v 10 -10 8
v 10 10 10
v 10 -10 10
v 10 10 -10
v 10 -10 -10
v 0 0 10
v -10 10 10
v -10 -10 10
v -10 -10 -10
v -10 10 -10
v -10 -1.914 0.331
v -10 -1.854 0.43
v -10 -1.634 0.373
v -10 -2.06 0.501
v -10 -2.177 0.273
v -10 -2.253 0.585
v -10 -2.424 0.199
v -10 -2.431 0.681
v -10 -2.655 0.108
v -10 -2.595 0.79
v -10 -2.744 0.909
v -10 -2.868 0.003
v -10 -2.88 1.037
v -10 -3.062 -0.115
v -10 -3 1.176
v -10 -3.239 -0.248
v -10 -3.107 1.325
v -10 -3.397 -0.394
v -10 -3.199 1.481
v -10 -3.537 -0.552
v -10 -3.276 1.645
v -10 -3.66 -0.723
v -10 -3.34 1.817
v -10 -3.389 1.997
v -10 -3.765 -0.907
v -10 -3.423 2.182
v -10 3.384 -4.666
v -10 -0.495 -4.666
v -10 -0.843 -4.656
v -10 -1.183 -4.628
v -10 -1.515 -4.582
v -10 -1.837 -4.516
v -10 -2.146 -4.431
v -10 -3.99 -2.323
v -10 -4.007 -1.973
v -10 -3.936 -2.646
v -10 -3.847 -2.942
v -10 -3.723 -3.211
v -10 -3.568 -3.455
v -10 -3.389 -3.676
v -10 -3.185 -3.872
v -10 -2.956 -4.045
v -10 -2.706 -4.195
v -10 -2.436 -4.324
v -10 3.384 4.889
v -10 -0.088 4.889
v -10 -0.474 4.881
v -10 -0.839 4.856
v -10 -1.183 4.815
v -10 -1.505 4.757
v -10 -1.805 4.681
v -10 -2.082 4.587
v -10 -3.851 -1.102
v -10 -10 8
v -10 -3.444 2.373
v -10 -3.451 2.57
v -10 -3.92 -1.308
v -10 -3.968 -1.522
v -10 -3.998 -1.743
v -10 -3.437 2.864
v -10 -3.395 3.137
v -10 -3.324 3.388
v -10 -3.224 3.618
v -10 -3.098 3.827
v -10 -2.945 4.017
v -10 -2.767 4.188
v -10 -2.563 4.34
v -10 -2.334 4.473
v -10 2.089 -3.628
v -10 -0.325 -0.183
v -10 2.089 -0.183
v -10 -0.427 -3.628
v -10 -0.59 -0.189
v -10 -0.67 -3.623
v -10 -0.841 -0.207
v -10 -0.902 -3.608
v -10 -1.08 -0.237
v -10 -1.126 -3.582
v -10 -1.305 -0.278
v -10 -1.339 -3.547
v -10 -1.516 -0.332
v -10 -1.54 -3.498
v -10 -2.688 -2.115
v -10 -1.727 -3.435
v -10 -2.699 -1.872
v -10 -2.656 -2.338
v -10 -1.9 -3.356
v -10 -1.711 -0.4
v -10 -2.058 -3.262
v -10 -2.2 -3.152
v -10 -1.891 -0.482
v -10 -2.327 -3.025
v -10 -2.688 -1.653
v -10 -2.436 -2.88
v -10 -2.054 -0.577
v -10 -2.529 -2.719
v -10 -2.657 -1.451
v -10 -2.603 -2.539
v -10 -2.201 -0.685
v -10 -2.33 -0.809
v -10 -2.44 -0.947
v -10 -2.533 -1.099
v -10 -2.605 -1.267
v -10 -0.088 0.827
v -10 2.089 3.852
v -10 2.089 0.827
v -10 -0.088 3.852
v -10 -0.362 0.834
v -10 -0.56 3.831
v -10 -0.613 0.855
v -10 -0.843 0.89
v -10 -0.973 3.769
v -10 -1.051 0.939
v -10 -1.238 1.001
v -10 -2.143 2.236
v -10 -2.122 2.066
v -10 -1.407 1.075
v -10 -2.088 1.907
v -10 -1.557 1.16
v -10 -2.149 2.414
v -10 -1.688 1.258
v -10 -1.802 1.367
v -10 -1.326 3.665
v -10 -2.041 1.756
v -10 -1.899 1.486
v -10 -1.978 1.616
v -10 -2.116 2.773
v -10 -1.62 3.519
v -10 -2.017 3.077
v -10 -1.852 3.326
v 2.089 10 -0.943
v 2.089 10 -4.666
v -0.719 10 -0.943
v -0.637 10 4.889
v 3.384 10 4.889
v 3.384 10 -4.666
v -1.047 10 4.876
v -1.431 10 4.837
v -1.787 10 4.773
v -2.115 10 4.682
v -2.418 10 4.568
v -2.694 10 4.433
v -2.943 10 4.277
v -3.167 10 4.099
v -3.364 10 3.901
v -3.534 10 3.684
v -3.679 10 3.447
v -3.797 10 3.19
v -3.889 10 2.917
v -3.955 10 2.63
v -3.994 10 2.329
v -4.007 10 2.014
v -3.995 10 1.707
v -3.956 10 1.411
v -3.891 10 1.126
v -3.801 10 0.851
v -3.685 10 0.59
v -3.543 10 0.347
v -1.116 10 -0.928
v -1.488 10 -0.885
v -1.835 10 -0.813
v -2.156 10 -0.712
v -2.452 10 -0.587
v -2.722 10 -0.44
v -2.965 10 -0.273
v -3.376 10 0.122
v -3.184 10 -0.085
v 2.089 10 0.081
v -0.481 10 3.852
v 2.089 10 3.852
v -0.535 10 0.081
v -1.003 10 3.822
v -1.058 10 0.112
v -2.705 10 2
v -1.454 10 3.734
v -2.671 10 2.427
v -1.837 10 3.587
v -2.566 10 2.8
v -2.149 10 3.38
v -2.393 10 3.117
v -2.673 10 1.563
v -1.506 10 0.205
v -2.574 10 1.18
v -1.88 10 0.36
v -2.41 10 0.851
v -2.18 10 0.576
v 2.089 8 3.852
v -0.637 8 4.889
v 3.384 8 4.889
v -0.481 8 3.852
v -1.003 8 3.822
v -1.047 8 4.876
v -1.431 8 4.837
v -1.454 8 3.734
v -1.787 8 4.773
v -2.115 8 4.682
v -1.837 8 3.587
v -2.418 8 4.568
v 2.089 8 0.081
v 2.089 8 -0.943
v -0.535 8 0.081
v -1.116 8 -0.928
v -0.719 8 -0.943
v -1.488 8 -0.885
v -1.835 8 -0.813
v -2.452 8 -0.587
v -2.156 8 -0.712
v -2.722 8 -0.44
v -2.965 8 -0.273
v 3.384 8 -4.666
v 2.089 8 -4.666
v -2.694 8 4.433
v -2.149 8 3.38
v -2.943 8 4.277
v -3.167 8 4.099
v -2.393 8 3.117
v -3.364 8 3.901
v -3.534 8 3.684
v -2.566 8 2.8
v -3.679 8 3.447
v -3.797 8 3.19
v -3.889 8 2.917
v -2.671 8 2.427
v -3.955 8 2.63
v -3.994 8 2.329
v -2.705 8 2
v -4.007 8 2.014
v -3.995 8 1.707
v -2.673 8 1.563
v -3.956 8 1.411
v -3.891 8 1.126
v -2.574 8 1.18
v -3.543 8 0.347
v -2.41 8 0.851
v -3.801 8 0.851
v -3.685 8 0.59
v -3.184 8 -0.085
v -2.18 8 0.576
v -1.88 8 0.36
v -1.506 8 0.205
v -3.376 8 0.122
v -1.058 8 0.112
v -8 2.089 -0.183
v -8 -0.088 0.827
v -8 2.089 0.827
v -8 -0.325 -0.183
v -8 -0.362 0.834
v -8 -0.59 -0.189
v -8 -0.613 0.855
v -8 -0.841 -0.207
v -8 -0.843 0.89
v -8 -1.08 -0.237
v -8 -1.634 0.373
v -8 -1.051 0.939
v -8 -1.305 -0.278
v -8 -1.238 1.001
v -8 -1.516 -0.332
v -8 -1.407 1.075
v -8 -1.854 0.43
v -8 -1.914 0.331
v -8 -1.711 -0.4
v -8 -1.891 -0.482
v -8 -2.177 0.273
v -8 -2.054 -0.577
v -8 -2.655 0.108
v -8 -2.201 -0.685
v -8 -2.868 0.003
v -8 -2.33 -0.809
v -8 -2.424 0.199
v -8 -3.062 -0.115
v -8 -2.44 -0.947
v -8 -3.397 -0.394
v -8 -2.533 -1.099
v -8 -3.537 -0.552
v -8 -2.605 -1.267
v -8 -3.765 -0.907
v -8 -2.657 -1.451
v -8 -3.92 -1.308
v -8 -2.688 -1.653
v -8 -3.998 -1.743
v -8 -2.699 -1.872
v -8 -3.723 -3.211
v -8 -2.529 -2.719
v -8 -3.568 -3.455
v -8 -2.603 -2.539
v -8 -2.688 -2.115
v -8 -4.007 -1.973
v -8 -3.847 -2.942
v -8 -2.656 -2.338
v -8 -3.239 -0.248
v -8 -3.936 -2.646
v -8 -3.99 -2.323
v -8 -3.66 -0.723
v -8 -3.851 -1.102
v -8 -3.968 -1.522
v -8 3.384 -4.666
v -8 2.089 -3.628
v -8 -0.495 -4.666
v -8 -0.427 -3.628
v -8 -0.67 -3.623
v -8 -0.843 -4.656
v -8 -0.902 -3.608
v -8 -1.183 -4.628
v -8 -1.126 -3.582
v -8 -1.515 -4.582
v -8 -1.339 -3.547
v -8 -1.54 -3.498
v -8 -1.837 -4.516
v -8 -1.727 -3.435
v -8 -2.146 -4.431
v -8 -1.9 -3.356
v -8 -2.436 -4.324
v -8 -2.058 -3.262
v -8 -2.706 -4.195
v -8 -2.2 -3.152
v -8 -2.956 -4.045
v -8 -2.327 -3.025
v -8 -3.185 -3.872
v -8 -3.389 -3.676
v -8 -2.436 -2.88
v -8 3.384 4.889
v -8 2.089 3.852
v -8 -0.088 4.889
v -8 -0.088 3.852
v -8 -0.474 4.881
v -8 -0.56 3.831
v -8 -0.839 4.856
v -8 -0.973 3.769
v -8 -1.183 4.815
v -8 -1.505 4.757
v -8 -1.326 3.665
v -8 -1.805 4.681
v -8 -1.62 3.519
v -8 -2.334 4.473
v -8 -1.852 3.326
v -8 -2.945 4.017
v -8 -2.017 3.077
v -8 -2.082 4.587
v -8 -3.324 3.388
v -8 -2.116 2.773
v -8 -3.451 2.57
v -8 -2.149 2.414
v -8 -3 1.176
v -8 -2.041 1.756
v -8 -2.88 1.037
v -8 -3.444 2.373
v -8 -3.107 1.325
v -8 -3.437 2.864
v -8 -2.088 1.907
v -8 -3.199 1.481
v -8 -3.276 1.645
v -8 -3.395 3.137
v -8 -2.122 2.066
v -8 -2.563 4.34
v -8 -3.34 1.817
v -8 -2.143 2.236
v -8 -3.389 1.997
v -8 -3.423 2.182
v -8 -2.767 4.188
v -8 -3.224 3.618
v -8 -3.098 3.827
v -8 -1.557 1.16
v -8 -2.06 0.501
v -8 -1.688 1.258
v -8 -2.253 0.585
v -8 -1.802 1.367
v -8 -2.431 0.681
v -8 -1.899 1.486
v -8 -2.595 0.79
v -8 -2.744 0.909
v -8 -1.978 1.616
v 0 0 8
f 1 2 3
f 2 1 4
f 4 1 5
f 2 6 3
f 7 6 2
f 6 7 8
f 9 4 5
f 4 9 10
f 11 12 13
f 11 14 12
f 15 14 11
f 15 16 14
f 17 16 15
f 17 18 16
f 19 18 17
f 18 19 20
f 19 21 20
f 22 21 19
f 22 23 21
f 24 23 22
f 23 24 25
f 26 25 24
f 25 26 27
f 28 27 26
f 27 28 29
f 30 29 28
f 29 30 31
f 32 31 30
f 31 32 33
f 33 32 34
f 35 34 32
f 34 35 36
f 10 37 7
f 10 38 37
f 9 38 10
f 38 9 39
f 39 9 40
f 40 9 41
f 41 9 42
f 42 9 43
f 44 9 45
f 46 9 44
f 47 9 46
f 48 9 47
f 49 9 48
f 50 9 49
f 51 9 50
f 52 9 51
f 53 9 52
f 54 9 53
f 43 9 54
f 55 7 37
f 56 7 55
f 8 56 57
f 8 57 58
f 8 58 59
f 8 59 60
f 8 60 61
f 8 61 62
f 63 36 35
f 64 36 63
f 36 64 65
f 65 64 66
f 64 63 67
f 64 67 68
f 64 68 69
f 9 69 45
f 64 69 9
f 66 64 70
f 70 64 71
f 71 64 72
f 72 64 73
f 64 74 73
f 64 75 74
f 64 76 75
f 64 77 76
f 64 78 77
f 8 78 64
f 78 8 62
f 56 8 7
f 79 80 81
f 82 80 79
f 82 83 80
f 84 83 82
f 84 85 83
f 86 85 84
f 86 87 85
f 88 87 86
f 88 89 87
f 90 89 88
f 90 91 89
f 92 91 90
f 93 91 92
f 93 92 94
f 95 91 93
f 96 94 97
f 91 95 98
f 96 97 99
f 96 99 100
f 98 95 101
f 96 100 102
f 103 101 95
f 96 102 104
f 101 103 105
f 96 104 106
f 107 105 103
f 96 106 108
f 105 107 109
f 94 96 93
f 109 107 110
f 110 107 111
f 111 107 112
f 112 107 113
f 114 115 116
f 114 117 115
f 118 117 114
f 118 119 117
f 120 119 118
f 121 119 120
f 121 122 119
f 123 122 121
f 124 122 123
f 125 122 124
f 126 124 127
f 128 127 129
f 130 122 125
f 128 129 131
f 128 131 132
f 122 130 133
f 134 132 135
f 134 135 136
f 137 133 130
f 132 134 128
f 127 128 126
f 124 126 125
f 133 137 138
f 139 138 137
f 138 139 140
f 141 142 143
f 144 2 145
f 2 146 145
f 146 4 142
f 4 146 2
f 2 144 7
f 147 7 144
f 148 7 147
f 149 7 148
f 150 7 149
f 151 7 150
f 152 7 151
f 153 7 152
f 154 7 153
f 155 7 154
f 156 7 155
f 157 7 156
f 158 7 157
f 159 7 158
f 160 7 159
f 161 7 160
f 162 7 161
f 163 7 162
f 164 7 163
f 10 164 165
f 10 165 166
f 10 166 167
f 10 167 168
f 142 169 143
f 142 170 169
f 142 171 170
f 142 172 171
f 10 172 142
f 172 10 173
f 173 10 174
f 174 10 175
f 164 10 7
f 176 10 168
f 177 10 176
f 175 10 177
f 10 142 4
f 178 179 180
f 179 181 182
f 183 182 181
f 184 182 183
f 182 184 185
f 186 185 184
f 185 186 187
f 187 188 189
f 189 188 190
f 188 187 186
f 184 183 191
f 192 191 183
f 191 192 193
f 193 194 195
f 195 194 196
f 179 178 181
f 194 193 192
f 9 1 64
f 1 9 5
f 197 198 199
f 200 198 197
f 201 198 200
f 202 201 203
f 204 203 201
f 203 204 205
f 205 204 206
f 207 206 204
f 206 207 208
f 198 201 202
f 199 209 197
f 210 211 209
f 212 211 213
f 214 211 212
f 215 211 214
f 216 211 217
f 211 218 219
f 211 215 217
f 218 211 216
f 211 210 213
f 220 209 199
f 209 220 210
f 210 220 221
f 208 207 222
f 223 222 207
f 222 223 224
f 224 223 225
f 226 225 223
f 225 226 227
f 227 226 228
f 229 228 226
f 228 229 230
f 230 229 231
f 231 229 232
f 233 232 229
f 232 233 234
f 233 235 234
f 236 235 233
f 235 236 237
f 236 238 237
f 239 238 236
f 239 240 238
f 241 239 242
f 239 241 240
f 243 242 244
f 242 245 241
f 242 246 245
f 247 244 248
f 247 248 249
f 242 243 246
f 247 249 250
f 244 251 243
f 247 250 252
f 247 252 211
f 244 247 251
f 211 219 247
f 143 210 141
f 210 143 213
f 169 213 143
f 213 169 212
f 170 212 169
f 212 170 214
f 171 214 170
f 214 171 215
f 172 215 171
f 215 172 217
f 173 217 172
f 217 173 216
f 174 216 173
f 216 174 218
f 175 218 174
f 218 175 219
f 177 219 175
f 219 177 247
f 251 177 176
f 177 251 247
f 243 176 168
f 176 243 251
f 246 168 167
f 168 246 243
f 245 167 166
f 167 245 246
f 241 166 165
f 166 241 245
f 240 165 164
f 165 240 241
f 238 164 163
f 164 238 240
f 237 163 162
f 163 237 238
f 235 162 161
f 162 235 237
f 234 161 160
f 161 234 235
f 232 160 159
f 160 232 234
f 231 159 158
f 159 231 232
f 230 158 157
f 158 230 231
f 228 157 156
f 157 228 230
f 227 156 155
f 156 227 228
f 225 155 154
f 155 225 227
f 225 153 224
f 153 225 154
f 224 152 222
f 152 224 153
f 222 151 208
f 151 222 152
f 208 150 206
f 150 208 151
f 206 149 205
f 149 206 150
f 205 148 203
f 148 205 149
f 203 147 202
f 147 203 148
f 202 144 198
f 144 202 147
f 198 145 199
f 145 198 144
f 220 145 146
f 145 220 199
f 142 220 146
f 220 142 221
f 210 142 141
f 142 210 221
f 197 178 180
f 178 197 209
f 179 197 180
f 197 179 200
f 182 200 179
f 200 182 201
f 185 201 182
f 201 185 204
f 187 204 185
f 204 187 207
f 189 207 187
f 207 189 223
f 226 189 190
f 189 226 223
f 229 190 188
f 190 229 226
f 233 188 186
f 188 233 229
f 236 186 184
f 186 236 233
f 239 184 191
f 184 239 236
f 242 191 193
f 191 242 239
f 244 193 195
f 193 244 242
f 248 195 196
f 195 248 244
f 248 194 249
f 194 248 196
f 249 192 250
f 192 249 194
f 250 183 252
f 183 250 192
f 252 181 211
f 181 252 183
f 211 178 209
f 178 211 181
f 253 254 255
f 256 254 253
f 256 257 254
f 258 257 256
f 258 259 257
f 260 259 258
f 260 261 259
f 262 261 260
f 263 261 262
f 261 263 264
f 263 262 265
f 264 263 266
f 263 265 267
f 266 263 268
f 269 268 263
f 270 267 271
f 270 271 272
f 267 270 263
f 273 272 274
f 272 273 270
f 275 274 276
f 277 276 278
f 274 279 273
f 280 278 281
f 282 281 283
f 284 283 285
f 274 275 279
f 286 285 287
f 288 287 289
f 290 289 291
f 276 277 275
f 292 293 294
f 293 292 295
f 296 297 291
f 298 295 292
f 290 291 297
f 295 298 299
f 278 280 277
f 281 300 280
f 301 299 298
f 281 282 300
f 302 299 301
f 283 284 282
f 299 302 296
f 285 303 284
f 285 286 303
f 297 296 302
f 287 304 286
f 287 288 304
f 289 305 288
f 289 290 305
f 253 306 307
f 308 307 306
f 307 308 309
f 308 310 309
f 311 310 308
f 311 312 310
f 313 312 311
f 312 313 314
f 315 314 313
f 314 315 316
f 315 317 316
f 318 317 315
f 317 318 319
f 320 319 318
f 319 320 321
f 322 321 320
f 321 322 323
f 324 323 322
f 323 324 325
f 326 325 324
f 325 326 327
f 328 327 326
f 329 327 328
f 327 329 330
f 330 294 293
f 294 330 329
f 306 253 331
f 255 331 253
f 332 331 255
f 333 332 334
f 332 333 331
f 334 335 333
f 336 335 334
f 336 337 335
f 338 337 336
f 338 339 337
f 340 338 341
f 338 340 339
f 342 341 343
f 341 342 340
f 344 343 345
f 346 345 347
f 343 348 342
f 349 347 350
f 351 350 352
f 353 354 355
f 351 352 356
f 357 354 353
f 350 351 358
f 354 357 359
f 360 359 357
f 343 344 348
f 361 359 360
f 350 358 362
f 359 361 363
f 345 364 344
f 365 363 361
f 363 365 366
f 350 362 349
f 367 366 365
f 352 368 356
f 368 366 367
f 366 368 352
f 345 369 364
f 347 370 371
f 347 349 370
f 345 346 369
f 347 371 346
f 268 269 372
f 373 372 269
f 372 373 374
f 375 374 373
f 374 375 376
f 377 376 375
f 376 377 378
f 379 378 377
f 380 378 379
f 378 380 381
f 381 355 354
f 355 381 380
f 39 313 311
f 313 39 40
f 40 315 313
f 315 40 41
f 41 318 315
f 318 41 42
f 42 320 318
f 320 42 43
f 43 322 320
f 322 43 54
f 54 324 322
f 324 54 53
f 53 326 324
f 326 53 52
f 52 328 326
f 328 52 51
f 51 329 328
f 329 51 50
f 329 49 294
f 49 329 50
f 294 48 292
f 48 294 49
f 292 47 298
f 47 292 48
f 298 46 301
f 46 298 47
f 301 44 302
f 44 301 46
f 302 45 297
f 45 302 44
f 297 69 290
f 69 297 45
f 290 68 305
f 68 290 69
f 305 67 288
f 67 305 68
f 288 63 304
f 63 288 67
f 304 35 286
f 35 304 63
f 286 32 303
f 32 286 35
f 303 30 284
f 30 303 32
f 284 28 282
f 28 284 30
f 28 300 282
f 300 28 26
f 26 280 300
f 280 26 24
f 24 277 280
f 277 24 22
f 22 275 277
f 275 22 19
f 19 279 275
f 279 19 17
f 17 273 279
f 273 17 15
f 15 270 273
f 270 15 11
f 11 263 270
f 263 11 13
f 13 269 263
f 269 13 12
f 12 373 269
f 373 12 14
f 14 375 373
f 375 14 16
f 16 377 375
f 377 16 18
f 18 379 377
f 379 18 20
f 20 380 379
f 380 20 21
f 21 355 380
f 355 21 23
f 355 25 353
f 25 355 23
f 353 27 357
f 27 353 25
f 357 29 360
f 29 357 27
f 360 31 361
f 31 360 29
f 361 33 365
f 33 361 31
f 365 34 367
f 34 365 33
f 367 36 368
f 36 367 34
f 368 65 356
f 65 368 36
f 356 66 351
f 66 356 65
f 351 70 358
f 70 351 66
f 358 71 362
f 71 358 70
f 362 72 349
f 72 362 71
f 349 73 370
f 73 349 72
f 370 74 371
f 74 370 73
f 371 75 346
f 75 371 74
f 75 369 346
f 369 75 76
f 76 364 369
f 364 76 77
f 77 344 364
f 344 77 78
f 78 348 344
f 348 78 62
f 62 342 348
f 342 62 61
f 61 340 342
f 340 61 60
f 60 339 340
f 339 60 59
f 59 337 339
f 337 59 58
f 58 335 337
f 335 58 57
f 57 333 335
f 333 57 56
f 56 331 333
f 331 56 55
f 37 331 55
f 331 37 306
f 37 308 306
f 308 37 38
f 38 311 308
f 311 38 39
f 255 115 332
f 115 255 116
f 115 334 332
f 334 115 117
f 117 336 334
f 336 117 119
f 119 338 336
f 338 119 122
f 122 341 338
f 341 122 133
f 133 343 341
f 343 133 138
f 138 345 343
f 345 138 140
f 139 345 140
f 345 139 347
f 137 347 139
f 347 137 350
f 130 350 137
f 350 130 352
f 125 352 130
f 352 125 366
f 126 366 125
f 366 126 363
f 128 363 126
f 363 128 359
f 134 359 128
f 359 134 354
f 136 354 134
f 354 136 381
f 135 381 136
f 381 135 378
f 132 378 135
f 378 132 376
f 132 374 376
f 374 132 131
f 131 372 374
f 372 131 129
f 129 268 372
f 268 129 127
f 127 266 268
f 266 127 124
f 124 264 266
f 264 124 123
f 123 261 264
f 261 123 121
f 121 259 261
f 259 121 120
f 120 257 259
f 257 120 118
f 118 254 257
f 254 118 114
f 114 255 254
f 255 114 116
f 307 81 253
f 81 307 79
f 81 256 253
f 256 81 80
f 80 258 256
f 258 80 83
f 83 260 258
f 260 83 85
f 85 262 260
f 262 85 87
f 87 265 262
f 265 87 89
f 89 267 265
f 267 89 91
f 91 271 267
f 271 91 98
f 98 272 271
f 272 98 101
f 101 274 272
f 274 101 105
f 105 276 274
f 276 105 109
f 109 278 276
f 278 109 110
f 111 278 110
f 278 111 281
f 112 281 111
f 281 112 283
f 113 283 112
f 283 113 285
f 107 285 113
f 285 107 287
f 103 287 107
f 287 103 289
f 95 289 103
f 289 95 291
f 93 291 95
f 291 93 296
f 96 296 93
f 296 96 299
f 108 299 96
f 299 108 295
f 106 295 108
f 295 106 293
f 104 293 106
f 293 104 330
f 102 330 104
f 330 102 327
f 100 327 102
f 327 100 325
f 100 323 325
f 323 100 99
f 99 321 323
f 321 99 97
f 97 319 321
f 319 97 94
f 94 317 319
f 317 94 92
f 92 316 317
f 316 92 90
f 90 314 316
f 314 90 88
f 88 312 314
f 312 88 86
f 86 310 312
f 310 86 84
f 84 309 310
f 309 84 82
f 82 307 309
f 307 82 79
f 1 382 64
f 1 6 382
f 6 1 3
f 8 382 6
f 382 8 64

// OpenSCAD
// Parameters
cube_size = 20; // Size of the cube
letter_depth = 2; // Depth of the engraved letters
triangle_height = 10; // Height of the triangle




// Cube with engraved letters
difference() {
    cube(cube_size, center=true);


    rotate([90, 0, 0]){
      translate([0, 0, -cube_size/2 + letter_depth]){
         rotate([0, 180, 0]){
          linear_extrude(height = letter_depth + 1){
              text("P", size = cube_size/2, valign = "center", halign = "center");
          }
         }
      }
    }

    rotate([0, 90, 0]){
      translate([0, 0, -cube_size/2 + letter_depth]){
         rotate([0, 180, 90]){
          linear_extrude(height = letter_depth + 1){
              text("B", size = cube_size/2, valign = "center", halign = "center");
          }
         }
      }
    }

    /*
    translate([0, 0, cube_size/2]){
        rotate([180, 0, 0]){
            linear_extrude(height = letter_depth + 1){
                text("B", size = cube_size/2, valign = "center", halign = "center");
            }
        }
    }
    */


    // Triangle on top
    translate([0, 0, cube_size/2-letter_depth]){
        linear_extrude(height = triangle_height){
             polygon(points=[[0, 0], [-cube_size/2, -cube_size/2], [cube_size/2, -cube_size/2]]);
        }
    }
}
